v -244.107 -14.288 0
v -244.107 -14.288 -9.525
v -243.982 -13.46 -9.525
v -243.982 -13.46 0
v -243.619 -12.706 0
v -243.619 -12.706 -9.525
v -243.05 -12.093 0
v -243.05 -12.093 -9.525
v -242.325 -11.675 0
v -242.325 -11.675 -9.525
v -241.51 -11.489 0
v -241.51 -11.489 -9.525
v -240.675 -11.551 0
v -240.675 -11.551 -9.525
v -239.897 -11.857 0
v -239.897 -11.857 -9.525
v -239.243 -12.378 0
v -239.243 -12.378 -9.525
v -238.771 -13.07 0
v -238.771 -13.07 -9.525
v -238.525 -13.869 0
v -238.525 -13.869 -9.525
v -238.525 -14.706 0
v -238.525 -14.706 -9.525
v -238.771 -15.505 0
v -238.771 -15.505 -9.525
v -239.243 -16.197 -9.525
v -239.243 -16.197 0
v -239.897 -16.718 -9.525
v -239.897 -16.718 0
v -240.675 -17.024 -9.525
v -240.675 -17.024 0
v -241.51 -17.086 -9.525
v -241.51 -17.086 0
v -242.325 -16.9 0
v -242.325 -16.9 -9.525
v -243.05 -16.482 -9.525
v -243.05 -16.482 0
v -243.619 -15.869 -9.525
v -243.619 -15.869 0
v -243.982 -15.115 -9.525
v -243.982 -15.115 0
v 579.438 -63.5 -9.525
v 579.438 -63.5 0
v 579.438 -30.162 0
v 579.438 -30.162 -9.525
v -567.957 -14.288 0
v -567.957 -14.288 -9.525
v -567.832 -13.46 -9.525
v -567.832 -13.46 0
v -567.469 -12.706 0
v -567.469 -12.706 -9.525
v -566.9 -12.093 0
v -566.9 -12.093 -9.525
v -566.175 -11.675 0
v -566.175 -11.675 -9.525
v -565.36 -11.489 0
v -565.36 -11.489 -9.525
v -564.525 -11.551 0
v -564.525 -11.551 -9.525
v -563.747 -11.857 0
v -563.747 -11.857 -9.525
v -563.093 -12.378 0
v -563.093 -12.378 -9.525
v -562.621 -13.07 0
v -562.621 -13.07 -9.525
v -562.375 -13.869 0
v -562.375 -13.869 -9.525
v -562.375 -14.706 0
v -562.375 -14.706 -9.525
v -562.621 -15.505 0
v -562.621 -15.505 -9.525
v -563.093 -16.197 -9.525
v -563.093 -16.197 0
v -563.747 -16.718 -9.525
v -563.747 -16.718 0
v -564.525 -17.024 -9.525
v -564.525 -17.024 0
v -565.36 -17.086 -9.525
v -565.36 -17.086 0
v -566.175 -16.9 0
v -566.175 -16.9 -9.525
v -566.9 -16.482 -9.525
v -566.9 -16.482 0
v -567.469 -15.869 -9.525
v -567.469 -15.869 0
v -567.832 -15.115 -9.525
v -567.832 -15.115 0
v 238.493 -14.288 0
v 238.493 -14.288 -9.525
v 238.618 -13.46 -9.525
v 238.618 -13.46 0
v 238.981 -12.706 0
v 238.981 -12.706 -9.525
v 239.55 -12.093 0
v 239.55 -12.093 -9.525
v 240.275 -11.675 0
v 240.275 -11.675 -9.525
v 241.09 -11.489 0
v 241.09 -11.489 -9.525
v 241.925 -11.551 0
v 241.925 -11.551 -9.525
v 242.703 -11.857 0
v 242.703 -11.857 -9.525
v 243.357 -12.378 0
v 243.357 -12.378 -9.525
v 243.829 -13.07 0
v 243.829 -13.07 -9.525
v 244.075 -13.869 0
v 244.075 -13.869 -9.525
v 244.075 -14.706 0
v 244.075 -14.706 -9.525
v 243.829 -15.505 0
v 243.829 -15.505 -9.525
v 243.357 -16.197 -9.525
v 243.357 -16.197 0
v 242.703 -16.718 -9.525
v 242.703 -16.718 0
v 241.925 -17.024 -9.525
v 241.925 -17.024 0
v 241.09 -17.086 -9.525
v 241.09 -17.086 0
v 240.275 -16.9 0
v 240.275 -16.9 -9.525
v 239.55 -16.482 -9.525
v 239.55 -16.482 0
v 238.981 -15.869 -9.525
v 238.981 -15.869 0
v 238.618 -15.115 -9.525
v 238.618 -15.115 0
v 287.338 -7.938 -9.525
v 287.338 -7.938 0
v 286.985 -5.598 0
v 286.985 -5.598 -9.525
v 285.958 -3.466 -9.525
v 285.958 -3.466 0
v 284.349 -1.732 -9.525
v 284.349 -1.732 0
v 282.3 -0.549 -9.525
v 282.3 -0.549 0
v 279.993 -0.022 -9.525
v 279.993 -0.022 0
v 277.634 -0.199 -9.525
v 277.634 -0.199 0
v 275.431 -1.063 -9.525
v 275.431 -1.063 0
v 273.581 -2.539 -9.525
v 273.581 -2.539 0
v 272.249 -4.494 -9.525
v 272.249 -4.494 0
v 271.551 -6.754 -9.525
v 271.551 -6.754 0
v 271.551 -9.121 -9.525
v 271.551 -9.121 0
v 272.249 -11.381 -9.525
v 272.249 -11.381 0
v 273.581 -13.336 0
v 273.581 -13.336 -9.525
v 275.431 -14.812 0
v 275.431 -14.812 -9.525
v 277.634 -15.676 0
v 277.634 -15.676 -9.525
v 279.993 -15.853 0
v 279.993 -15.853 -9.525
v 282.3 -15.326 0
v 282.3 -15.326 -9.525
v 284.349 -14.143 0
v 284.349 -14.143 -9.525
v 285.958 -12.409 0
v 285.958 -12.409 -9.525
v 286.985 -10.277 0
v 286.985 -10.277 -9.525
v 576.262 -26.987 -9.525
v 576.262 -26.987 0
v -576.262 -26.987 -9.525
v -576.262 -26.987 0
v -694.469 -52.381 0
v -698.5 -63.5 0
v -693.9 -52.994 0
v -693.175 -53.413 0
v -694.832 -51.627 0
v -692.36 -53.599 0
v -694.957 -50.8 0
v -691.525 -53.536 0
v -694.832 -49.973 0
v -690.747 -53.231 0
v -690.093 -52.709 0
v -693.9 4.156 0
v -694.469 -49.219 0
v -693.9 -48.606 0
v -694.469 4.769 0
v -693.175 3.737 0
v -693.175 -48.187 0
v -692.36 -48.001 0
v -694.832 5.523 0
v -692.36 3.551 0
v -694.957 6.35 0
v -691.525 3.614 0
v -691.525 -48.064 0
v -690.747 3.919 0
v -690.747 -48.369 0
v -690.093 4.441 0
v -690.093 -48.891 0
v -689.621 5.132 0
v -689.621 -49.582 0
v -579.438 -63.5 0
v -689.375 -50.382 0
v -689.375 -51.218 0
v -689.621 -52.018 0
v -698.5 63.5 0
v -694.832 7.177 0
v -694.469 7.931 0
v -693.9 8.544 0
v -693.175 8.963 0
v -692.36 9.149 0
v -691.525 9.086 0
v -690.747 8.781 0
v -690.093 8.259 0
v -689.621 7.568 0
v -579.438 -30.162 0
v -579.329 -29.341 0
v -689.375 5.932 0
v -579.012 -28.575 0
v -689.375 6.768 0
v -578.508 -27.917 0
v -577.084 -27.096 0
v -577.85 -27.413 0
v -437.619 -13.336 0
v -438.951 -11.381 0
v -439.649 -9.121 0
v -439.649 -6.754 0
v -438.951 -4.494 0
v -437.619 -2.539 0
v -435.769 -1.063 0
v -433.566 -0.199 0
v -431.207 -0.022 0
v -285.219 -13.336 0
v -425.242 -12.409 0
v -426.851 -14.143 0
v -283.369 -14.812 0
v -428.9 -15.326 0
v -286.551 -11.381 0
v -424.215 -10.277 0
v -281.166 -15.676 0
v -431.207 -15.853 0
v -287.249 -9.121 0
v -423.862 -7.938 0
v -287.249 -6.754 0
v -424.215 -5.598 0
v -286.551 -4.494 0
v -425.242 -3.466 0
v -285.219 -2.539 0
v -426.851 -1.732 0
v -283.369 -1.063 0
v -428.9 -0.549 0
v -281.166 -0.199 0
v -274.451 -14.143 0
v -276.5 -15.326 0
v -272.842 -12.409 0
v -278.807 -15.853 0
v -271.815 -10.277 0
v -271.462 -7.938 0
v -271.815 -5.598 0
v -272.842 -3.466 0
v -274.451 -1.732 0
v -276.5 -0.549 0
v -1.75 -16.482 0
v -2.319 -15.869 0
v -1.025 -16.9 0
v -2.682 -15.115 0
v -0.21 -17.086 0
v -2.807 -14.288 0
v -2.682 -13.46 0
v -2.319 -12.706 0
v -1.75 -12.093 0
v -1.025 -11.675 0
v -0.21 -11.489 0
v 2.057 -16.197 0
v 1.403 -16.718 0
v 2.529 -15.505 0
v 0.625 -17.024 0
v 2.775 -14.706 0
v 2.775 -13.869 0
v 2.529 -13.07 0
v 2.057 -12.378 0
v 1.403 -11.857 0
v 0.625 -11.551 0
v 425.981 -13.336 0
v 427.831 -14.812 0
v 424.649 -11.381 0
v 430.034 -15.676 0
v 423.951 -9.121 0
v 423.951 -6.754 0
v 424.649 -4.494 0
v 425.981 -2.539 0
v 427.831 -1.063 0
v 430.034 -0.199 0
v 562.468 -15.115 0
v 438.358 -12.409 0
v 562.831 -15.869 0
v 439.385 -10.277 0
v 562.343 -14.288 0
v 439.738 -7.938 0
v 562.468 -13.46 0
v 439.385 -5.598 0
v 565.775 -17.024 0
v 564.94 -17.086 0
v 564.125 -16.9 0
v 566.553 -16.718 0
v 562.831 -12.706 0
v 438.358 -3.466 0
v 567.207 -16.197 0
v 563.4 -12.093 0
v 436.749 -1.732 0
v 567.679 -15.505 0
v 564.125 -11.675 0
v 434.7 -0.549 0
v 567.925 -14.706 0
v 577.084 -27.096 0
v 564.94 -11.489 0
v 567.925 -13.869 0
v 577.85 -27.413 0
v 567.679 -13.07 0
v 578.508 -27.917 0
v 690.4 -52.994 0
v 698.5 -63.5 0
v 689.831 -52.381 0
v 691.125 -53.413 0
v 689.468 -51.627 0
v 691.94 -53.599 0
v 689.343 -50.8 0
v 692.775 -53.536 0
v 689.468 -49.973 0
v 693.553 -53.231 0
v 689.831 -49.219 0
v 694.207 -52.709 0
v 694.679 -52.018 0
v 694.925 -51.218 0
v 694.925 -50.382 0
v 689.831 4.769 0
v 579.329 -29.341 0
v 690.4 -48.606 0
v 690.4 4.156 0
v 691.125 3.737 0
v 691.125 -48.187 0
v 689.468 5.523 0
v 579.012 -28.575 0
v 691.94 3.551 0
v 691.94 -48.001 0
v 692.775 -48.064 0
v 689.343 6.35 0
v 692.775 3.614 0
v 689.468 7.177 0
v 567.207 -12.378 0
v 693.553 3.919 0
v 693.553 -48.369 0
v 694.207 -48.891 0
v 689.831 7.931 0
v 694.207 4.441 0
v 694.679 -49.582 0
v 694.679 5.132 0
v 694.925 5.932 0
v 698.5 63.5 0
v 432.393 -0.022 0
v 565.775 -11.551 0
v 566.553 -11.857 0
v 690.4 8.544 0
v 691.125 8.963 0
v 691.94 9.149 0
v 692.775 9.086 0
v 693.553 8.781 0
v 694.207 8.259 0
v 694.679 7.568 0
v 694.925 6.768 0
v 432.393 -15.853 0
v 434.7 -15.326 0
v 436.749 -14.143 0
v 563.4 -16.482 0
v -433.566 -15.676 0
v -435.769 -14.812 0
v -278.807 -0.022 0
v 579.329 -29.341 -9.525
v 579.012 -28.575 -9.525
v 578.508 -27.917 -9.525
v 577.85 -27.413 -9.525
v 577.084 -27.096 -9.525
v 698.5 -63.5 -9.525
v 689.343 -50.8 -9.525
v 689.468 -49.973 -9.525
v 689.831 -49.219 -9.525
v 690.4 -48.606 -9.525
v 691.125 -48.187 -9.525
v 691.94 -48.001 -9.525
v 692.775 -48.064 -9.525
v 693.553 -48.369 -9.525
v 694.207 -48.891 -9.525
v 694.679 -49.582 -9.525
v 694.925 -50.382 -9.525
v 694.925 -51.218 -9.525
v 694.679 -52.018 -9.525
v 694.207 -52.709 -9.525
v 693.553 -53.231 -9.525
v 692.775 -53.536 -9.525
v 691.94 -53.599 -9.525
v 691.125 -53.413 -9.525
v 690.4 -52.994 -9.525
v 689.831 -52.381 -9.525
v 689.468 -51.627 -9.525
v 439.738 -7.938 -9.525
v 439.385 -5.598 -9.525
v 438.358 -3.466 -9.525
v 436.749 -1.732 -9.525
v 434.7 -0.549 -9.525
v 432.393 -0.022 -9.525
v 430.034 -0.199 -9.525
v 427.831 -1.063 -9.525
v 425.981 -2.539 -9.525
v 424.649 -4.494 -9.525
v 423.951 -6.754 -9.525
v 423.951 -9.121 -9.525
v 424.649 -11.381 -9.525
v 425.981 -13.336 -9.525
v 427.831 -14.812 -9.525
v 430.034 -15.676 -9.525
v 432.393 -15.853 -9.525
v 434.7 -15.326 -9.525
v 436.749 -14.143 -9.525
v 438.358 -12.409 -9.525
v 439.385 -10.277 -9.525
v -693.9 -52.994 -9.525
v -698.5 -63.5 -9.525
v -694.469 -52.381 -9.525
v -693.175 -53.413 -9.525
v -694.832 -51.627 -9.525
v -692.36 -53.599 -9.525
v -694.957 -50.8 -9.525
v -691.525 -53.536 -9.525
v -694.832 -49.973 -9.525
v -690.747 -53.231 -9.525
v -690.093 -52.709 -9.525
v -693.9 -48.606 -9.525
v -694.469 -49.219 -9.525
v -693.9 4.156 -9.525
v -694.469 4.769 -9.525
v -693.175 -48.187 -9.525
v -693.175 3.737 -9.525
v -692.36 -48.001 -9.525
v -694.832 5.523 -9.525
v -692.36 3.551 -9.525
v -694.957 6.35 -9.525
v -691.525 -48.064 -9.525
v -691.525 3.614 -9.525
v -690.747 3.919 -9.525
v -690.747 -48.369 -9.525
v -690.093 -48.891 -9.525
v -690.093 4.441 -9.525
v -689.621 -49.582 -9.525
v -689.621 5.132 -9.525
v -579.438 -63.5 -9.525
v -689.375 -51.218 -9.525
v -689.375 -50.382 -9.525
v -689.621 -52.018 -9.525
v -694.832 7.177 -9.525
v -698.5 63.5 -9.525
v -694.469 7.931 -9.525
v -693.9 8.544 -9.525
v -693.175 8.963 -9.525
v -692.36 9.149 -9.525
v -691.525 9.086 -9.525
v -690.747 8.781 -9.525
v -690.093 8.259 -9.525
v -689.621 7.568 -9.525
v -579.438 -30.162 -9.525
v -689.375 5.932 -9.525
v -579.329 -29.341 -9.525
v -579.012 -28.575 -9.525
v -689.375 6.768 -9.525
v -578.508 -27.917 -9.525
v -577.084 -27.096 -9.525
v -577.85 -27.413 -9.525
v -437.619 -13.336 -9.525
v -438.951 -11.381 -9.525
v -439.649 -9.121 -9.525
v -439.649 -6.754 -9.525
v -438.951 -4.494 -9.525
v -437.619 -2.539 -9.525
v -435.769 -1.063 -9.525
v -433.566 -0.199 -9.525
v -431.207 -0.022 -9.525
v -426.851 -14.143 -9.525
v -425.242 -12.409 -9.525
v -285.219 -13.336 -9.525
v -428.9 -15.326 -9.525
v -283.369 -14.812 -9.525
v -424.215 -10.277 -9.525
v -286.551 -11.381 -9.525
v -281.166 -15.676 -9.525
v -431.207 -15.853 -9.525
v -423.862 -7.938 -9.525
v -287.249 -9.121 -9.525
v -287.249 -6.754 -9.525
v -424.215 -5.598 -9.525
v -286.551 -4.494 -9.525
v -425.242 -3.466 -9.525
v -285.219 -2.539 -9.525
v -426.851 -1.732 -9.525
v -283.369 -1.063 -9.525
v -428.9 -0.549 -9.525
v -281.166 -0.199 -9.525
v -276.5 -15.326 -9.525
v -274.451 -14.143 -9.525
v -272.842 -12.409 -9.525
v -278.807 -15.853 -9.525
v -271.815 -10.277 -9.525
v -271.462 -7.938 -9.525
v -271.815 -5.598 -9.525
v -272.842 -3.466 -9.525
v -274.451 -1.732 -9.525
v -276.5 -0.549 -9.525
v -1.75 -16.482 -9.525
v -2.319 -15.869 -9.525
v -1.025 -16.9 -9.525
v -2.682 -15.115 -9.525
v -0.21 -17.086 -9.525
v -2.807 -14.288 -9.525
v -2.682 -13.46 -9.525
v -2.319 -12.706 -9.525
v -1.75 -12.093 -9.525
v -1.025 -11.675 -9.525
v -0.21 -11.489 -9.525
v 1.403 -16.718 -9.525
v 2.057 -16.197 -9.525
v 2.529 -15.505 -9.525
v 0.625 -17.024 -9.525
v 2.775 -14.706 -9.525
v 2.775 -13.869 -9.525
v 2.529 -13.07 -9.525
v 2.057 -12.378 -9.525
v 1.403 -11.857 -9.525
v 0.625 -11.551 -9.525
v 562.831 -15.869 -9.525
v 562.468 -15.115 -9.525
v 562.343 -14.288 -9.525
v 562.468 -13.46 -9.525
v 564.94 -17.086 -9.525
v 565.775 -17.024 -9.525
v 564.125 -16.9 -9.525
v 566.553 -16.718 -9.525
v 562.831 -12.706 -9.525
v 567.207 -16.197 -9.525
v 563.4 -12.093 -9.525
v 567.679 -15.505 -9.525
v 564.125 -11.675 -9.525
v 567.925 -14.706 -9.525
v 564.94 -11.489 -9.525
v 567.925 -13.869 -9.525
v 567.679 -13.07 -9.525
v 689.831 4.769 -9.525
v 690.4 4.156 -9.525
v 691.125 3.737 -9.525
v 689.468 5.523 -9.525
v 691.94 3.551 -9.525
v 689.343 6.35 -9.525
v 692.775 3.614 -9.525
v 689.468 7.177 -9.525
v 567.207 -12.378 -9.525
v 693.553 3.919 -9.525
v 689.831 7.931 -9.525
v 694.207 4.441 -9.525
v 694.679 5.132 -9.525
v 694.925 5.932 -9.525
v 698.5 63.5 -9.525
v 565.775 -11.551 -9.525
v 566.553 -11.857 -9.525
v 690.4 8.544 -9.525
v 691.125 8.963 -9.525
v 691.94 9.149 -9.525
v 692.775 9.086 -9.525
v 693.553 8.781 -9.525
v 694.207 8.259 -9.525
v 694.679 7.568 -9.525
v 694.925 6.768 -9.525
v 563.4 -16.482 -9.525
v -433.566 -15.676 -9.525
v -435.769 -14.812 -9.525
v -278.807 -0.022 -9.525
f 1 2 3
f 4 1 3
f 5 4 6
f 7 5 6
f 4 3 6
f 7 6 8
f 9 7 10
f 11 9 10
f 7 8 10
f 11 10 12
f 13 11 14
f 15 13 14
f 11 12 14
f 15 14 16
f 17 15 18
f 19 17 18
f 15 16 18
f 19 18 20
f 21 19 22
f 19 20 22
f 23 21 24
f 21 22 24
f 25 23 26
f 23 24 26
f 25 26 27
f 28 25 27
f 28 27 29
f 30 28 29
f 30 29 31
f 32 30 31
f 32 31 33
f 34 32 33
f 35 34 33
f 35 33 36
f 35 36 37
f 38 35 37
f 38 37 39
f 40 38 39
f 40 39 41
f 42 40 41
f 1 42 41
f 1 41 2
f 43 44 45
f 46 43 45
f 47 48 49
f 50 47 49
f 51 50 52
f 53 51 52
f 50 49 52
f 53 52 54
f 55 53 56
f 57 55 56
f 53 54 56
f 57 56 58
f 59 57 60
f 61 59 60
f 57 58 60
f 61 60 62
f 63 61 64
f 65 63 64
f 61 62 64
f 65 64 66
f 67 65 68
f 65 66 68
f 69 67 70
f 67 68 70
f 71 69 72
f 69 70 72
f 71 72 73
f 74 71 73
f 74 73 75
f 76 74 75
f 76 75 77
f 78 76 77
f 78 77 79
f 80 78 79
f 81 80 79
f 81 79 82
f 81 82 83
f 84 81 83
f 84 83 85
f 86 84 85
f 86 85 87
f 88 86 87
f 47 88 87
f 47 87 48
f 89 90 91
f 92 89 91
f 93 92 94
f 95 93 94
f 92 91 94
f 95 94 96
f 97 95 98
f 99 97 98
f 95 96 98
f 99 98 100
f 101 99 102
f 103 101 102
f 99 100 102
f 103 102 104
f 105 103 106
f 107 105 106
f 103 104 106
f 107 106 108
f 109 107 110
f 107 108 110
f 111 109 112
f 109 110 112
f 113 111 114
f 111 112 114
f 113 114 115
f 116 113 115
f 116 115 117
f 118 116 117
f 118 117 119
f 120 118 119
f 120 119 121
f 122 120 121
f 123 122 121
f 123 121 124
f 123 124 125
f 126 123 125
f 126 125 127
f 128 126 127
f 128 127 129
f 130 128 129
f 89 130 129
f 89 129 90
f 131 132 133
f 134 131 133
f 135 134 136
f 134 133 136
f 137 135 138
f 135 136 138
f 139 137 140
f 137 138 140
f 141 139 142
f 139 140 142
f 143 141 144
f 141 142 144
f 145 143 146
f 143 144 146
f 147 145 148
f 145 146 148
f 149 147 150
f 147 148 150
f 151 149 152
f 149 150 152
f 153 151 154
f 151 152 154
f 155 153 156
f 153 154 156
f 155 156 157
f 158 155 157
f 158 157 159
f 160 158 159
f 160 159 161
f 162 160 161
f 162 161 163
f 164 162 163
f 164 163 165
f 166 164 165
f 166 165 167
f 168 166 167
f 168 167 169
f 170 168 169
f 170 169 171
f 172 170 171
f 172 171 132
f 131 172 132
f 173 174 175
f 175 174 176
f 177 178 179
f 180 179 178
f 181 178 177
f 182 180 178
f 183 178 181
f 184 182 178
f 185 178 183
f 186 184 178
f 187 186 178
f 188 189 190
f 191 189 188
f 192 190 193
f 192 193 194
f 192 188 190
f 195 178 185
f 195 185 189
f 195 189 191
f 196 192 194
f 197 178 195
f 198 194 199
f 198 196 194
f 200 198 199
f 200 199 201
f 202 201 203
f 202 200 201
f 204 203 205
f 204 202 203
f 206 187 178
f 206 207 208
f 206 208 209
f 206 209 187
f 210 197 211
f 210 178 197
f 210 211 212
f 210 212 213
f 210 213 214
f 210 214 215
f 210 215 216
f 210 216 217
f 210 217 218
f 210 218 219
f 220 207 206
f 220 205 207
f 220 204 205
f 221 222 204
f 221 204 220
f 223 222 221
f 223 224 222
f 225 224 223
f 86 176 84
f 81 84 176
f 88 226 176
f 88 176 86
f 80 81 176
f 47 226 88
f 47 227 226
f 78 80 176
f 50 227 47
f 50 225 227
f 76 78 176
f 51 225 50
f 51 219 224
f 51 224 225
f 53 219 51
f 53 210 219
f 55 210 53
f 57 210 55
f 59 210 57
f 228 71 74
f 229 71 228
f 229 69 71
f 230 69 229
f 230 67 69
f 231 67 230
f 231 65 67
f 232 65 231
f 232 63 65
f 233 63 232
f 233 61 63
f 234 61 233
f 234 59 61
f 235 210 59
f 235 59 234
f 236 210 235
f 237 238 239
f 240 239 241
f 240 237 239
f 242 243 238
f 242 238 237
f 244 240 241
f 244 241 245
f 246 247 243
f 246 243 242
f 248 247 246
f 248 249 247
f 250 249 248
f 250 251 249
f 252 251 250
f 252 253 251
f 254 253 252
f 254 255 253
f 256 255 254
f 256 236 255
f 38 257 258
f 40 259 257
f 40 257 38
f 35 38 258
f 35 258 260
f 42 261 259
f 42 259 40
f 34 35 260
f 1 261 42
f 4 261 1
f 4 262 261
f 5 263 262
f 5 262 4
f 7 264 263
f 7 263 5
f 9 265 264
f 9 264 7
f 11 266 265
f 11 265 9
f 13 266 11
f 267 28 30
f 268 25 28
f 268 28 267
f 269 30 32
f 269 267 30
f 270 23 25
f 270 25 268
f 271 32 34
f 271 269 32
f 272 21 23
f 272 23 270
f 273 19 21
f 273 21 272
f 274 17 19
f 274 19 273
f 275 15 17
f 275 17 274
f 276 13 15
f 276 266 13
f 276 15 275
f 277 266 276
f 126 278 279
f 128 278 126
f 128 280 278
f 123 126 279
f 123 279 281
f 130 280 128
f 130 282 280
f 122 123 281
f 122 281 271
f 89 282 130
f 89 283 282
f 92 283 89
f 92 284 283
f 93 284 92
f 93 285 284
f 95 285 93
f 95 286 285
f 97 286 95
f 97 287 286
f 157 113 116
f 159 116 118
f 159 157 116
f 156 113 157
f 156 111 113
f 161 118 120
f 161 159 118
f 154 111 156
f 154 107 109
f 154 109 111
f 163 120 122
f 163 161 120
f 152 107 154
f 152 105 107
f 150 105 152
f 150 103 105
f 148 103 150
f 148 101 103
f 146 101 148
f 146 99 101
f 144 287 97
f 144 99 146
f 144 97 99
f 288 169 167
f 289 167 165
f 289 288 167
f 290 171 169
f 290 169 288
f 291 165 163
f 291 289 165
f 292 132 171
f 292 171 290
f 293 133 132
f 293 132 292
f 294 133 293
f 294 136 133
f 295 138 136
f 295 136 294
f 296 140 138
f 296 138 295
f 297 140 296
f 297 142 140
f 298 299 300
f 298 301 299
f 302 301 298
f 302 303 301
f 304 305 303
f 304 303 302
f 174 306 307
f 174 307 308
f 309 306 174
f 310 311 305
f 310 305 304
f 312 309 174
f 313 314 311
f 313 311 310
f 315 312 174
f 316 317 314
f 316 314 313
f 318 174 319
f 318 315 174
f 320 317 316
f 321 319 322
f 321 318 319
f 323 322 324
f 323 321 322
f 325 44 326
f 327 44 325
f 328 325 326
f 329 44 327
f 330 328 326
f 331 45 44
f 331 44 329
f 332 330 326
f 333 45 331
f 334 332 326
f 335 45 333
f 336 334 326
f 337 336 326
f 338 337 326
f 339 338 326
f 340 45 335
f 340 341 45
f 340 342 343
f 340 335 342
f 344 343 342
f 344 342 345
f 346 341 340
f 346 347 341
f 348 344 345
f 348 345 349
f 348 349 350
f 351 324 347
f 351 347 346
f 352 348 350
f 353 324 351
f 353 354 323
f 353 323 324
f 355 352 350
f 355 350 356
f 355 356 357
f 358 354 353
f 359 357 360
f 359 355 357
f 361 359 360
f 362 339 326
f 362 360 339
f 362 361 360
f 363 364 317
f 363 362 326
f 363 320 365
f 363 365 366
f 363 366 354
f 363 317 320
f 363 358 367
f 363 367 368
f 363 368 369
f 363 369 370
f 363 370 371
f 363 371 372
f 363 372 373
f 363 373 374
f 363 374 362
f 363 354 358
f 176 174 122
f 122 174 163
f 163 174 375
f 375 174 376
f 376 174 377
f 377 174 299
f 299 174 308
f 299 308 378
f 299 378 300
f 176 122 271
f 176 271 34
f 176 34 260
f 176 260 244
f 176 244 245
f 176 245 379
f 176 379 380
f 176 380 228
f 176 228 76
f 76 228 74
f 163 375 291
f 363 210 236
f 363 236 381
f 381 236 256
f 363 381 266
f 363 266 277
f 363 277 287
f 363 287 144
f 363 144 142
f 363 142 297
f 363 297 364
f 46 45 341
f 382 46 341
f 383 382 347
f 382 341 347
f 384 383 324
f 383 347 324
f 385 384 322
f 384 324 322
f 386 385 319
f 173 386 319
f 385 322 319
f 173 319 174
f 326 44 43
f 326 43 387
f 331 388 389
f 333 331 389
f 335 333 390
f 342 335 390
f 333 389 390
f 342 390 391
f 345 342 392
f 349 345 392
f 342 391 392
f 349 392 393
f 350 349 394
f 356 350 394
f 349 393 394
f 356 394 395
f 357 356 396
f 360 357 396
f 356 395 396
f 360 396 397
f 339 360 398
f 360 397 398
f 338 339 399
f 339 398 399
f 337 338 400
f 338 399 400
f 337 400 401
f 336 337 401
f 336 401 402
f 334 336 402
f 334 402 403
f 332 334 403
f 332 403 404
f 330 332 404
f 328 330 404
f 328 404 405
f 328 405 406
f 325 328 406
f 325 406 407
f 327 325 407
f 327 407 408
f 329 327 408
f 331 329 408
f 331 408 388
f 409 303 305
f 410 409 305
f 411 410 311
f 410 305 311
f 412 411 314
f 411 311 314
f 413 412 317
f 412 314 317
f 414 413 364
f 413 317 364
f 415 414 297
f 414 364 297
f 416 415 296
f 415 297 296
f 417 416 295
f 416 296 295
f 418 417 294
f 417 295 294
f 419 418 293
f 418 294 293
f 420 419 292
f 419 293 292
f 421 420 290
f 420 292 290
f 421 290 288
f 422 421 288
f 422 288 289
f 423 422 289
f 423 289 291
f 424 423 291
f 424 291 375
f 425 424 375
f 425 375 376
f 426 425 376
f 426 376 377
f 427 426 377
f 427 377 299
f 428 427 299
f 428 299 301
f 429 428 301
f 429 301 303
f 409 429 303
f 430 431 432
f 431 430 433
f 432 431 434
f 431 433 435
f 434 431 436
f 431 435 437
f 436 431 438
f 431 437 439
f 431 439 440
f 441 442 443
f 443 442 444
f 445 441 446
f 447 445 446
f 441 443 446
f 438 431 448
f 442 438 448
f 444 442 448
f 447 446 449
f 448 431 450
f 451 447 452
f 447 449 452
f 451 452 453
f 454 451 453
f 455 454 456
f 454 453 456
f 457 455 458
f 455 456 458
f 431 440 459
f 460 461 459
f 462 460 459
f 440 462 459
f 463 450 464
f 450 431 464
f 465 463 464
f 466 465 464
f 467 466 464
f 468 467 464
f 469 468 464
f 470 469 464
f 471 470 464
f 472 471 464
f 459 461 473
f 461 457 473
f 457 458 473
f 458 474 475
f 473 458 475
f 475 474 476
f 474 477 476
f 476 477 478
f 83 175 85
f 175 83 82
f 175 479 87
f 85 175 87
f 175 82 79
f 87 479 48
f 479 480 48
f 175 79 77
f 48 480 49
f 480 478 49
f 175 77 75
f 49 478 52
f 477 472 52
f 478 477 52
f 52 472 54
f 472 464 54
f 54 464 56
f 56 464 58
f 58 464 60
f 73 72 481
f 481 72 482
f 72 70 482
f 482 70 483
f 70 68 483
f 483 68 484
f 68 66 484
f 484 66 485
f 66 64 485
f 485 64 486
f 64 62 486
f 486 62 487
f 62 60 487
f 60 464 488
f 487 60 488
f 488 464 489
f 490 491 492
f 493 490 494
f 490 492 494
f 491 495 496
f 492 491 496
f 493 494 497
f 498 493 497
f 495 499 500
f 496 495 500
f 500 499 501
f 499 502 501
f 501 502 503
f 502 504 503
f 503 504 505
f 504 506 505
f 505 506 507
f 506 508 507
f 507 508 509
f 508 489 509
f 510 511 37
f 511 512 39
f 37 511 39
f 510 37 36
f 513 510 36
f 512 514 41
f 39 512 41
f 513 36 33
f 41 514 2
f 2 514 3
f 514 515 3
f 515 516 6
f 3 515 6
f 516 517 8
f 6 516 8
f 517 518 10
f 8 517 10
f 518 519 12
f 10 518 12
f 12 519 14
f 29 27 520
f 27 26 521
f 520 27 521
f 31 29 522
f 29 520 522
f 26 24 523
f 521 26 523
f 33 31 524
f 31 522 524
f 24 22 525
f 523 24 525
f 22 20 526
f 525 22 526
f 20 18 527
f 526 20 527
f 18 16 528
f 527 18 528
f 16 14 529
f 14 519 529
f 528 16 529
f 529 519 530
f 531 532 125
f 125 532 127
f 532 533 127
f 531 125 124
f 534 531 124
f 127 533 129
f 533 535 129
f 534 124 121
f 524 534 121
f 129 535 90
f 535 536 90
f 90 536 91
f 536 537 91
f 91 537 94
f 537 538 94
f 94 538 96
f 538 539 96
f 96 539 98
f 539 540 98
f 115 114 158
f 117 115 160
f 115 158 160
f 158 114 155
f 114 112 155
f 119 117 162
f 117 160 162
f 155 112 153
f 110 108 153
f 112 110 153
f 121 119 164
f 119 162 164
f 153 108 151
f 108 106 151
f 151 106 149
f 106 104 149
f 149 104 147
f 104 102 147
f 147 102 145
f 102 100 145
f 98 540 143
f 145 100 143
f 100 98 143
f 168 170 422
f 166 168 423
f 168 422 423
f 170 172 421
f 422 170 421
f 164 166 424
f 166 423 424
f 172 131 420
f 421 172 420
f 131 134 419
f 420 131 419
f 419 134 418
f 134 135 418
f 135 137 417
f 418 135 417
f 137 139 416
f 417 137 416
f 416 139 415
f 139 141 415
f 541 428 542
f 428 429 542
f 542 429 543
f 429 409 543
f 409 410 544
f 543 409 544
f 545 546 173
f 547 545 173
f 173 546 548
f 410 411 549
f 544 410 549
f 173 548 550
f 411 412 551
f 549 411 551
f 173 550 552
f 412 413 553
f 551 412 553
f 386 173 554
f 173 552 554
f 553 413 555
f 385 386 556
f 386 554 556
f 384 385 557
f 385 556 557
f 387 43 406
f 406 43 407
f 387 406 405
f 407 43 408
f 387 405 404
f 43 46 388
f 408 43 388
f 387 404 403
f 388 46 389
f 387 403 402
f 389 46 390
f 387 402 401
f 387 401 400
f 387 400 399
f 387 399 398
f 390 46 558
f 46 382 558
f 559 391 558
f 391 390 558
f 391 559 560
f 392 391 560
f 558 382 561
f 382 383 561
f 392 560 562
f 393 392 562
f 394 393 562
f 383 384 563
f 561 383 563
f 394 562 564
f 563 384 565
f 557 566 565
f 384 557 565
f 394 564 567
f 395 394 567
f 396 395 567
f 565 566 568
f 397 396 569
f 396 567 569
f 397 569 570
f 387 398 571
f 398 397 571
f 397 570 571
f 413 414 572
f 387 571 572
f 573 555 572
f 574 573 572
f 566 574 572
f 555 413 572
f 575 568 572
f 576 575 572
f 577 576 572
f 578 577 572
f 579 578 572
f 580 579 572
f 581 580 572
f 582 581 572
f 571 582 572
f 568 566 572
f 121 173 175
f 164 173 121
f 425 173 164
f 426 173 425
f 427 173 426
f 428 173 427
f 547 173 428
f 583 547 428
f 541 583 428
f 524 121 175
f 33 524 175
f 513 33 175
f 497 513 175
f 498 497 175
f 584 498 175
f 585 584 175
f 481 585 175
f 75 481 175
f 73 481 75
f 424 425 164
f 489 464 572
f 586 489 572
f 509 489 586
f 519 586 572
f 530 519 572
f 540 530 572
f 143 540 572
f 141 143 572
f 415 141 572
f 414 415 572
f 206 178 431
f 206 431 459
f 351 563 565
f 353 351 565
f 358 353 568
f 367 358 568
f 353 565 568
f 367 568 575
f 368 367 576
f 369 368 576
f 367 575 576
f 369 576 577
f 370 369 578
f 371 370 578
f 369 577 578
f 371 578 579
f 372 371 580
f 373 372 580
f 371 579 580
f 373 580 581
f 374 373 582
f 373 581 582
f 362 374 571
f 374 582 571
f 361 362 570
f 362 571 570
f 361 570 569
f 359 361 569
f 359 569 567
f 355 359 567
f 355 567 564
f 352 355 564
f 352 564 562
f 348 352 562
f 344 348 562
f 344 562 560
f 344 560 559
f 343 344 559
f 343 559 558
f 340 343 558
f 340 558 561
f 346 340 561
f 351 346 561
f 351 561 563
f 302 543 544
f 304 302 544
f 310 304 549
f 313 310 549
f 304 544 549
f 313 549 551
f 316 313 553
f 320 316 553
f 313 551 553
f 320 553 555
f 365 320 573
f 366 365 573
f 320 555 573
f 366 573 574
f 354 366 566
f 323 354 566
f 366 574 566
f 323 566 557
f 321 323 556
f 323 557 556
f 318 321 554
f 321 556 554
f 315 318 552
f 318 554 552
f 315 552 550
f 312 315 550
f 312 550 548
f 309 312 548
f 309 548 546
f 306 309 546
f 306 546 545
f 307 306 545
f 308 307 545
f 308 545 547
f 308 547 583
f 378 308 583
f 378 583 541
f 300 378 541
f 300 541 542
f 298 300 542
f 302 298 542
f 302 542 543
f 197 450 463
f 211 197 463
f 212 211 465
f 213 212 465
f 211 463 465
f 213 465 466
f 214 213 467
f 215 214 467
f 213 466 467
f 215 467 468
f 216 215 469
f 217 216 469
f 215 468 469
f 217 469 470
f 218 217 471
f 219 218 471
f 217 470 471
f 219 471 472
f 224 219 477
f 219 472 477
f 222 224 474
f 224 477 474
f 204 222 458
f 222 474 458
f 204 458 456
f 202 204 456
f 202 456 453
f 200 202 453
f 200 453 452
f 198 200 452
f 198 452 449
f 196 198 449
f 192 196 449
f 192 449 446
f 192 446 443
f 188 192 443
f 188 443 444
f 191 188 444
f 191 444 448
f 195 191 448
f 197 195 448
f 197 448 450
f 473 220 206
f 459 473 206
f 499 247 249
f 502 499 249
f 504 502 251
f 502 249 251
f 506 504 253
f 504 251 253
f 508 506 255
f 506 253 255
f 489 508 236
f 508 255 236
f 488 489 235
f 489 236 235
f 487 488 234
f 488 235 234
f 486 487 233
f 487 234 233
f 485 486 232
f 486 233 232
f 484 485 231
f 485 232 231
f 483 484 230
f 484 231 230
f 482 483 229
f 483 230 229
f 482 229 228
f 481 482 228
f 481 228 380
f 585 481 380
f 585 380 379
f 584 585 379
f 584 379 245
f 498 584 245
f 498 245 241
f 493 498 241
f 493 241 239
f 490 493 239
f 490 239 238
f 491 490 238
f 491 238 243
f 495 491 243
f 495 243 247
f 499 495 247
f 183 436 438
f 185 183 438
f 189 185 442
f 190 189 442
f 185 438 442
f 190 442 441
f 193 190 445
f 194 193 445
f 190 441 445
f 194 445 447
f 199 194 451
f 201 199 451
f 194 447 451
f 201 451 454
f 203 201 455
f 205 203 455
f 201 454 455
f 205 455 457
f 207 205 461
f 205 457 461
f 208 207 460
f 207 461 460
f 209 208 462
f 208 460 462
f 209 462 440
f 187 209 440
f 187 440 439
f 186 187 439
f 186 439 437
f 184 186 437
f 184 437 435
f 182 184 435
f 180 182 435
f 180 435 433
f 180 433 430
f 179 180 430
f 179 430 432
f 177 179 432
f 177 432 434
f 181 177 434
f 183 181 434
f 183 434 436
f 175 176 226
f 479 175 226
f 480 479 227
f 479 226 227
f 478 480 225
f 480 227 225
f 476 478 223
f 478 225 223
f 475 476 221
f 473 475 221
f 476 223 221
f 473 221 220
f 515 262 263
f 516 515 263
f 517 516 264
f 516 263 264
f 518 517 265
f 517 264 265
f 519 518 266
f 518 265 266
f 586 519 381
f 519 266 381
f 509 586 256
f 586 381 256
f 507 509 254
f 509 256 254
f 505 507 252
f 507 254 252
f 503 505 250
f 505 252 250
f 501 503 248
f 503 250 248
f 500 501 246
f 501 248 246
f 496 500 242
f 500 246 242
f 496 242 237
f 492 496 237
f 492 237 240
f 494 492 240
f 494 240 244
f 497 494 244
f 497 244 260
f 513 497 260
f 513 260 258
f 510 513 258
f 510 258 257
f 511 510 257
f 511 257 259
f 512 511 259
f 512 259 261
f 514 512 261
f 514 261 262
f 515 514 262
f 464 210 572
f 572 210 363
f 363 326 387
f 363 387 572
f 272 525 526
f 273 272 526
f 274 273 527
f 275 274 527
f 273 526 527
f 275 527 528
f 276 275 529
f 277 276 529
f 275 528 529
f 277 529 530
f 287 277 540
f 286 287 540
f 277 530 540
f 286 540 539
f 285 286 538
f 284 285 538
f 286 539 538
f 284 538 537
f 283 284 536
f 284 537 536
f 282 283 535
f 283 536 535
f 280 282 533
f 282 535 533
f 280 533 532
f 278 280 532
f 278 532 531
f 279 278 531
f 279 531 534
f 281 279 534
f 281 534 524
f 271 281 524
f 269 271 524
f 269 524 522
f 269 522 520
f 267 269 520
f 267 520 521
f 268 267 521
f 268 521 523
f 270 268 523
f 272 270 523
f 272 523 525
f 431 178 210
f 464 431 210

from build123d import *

# Parameters (mm, degrees)
SKETCH1_W              = 1397
SKETCH1_H              = 127
BOSS_EXTRUDE1_DEPTH    = 9.525
CUT_EXTRUDE1_DEPTH     = 702.445098083
F_10_CLEARANCE_HOLE1_D = 5.6134
CUT_EXTRUDE2_REACH     = 703.445
SKETCH8_R              = 7.9375


with BuildPart() as part:
    # Sketch1 → Boss-Extrude1 (new body)
    with BuildSketch(Plane.XY):
        Rectangle(SKETCH1_W, SKETCH1_H)
    extrude(amount=-BOSS_EXTRUDE1_DEPTH)

    # Sketch2 → Cut-Extrude1 (cut, through all)
    with BuildSketch(Plane.XY):
        with BuildLine():
            Line((-579.4375, -63.5), (579.4375, -63.5))
            Line((579.4375, -63.5), (579.4375, -30.1625))
            ThreePointArc((579.4375, -30.1625), (578.50756403, -27.91743597), (576.2625, -26.9875))
            Line((576.2625, -26.9875), (-576.2625, -26.9875))
            ThreePointArc((-576.2625, -26.9875), (-578.50756403, -27.91743597), (-579.4375, -30.1625))
            Line((-579.4375, -30.1625), (-579.4375, -63.5))
        make_face()
    extrude(amount=-CUT_EXTRUDE1_DEPTH, mode=Mode.SUBTRACT)

    # #10 Clearance Hole1 (through all)
    with Locations(Plane.XY):
        with Locations((-692.15, 6.35), (-692.15, -50.8), (692.15, 6.35), (692.15, -50.8), (-565.15, -14.2875), (-241.3, -14.2875), (0, -14.2875), (241.3, -14.2875), (565.15, -14.2875)):
            Hole(F_10_CLEARANCE_HOLE1_D / 2)

    # Sketch8 → Cut-Extrude2 (cut, up to next)
    with BuildSketch(Plane.XY, mode=Mode.PRIVATE) as cut_extrude2_sk1:
        with Locations((-431.8, -7.9375)):
            Circle(SKETCH8_R)
    cut_extrude2_tool1 = extrude(cut_extrude2_sk1.sketch, amount=-CUT_EXTRUDE2_REACH, mode=Mode.PRIVATE) & part.part
    # Sketch8 → Cut-Extrude2 (cut, up to next)
    with BuildSketch(Plane.XY, mode=Mode.PRIVATE) as cut_extrude2_sk2:
        with Locations((-279.4, -7.9375)):
            Circle(SKETCH8_R)
    cut_extrude2_tool2 = extrude(cut_extrude2_sk2.sketch, amount=-CUT_EXTRUDE2_REACH, mode=Mode.PRIVATE) & part.part
    # Sketch8 → Cut-Extrude2 (cut, up to next)
    with BuildSketch(Plane.XY, mode=Mode.PRIVATE) as cut_extrude2_sk3:
        with Locations((279.4, -7.9375)):
            Circle(SKETCH8_R)
    cut_extrude2_tool3 = extrude(cut_extrude2_sk3.sketch, amount=-CUT_EXTRUDE2_REACH, mode=Mode.PRIVATE) & part.part
    # Sketch8 → Cut-Extrude2 (cut, up to next)
    with BuildSketch(Plane.XY, mode=Mode.PRIVATE) as cut_extrude2_sk4:
        with Locations((431.8, -7.9375)):
            Circle(SKETCH8_R)
    cut_extrude2_tool4 = extrude(cut_extrude2_sk4.sketch, amount=-CUT_EXTRUDE2_REACH, mode=Mode.PRIVATE) & part.part
    add(cut_extrude2_tool1.solids().sort_by_distance((-431.8, -7.9375, 0))[0], mode=Mode.SUBTRACT)
    add(cut_extrude2_tool2.solids().sort_by_distance((-279.4, -7.9375, 0))[0], mode=Mode.SUBTRACT)
    add(cut_extrude2_tool3.solids().sort_by_distance((279.4, -7.9375, 0))[0], mode=Mode.SUBTRACT)
    add(cut_extrude2_tool4.solids().sort_by_distance((431.8, -7.9375, 0))[0], mode=Mode.SUBTRACT)


solid = part.part
